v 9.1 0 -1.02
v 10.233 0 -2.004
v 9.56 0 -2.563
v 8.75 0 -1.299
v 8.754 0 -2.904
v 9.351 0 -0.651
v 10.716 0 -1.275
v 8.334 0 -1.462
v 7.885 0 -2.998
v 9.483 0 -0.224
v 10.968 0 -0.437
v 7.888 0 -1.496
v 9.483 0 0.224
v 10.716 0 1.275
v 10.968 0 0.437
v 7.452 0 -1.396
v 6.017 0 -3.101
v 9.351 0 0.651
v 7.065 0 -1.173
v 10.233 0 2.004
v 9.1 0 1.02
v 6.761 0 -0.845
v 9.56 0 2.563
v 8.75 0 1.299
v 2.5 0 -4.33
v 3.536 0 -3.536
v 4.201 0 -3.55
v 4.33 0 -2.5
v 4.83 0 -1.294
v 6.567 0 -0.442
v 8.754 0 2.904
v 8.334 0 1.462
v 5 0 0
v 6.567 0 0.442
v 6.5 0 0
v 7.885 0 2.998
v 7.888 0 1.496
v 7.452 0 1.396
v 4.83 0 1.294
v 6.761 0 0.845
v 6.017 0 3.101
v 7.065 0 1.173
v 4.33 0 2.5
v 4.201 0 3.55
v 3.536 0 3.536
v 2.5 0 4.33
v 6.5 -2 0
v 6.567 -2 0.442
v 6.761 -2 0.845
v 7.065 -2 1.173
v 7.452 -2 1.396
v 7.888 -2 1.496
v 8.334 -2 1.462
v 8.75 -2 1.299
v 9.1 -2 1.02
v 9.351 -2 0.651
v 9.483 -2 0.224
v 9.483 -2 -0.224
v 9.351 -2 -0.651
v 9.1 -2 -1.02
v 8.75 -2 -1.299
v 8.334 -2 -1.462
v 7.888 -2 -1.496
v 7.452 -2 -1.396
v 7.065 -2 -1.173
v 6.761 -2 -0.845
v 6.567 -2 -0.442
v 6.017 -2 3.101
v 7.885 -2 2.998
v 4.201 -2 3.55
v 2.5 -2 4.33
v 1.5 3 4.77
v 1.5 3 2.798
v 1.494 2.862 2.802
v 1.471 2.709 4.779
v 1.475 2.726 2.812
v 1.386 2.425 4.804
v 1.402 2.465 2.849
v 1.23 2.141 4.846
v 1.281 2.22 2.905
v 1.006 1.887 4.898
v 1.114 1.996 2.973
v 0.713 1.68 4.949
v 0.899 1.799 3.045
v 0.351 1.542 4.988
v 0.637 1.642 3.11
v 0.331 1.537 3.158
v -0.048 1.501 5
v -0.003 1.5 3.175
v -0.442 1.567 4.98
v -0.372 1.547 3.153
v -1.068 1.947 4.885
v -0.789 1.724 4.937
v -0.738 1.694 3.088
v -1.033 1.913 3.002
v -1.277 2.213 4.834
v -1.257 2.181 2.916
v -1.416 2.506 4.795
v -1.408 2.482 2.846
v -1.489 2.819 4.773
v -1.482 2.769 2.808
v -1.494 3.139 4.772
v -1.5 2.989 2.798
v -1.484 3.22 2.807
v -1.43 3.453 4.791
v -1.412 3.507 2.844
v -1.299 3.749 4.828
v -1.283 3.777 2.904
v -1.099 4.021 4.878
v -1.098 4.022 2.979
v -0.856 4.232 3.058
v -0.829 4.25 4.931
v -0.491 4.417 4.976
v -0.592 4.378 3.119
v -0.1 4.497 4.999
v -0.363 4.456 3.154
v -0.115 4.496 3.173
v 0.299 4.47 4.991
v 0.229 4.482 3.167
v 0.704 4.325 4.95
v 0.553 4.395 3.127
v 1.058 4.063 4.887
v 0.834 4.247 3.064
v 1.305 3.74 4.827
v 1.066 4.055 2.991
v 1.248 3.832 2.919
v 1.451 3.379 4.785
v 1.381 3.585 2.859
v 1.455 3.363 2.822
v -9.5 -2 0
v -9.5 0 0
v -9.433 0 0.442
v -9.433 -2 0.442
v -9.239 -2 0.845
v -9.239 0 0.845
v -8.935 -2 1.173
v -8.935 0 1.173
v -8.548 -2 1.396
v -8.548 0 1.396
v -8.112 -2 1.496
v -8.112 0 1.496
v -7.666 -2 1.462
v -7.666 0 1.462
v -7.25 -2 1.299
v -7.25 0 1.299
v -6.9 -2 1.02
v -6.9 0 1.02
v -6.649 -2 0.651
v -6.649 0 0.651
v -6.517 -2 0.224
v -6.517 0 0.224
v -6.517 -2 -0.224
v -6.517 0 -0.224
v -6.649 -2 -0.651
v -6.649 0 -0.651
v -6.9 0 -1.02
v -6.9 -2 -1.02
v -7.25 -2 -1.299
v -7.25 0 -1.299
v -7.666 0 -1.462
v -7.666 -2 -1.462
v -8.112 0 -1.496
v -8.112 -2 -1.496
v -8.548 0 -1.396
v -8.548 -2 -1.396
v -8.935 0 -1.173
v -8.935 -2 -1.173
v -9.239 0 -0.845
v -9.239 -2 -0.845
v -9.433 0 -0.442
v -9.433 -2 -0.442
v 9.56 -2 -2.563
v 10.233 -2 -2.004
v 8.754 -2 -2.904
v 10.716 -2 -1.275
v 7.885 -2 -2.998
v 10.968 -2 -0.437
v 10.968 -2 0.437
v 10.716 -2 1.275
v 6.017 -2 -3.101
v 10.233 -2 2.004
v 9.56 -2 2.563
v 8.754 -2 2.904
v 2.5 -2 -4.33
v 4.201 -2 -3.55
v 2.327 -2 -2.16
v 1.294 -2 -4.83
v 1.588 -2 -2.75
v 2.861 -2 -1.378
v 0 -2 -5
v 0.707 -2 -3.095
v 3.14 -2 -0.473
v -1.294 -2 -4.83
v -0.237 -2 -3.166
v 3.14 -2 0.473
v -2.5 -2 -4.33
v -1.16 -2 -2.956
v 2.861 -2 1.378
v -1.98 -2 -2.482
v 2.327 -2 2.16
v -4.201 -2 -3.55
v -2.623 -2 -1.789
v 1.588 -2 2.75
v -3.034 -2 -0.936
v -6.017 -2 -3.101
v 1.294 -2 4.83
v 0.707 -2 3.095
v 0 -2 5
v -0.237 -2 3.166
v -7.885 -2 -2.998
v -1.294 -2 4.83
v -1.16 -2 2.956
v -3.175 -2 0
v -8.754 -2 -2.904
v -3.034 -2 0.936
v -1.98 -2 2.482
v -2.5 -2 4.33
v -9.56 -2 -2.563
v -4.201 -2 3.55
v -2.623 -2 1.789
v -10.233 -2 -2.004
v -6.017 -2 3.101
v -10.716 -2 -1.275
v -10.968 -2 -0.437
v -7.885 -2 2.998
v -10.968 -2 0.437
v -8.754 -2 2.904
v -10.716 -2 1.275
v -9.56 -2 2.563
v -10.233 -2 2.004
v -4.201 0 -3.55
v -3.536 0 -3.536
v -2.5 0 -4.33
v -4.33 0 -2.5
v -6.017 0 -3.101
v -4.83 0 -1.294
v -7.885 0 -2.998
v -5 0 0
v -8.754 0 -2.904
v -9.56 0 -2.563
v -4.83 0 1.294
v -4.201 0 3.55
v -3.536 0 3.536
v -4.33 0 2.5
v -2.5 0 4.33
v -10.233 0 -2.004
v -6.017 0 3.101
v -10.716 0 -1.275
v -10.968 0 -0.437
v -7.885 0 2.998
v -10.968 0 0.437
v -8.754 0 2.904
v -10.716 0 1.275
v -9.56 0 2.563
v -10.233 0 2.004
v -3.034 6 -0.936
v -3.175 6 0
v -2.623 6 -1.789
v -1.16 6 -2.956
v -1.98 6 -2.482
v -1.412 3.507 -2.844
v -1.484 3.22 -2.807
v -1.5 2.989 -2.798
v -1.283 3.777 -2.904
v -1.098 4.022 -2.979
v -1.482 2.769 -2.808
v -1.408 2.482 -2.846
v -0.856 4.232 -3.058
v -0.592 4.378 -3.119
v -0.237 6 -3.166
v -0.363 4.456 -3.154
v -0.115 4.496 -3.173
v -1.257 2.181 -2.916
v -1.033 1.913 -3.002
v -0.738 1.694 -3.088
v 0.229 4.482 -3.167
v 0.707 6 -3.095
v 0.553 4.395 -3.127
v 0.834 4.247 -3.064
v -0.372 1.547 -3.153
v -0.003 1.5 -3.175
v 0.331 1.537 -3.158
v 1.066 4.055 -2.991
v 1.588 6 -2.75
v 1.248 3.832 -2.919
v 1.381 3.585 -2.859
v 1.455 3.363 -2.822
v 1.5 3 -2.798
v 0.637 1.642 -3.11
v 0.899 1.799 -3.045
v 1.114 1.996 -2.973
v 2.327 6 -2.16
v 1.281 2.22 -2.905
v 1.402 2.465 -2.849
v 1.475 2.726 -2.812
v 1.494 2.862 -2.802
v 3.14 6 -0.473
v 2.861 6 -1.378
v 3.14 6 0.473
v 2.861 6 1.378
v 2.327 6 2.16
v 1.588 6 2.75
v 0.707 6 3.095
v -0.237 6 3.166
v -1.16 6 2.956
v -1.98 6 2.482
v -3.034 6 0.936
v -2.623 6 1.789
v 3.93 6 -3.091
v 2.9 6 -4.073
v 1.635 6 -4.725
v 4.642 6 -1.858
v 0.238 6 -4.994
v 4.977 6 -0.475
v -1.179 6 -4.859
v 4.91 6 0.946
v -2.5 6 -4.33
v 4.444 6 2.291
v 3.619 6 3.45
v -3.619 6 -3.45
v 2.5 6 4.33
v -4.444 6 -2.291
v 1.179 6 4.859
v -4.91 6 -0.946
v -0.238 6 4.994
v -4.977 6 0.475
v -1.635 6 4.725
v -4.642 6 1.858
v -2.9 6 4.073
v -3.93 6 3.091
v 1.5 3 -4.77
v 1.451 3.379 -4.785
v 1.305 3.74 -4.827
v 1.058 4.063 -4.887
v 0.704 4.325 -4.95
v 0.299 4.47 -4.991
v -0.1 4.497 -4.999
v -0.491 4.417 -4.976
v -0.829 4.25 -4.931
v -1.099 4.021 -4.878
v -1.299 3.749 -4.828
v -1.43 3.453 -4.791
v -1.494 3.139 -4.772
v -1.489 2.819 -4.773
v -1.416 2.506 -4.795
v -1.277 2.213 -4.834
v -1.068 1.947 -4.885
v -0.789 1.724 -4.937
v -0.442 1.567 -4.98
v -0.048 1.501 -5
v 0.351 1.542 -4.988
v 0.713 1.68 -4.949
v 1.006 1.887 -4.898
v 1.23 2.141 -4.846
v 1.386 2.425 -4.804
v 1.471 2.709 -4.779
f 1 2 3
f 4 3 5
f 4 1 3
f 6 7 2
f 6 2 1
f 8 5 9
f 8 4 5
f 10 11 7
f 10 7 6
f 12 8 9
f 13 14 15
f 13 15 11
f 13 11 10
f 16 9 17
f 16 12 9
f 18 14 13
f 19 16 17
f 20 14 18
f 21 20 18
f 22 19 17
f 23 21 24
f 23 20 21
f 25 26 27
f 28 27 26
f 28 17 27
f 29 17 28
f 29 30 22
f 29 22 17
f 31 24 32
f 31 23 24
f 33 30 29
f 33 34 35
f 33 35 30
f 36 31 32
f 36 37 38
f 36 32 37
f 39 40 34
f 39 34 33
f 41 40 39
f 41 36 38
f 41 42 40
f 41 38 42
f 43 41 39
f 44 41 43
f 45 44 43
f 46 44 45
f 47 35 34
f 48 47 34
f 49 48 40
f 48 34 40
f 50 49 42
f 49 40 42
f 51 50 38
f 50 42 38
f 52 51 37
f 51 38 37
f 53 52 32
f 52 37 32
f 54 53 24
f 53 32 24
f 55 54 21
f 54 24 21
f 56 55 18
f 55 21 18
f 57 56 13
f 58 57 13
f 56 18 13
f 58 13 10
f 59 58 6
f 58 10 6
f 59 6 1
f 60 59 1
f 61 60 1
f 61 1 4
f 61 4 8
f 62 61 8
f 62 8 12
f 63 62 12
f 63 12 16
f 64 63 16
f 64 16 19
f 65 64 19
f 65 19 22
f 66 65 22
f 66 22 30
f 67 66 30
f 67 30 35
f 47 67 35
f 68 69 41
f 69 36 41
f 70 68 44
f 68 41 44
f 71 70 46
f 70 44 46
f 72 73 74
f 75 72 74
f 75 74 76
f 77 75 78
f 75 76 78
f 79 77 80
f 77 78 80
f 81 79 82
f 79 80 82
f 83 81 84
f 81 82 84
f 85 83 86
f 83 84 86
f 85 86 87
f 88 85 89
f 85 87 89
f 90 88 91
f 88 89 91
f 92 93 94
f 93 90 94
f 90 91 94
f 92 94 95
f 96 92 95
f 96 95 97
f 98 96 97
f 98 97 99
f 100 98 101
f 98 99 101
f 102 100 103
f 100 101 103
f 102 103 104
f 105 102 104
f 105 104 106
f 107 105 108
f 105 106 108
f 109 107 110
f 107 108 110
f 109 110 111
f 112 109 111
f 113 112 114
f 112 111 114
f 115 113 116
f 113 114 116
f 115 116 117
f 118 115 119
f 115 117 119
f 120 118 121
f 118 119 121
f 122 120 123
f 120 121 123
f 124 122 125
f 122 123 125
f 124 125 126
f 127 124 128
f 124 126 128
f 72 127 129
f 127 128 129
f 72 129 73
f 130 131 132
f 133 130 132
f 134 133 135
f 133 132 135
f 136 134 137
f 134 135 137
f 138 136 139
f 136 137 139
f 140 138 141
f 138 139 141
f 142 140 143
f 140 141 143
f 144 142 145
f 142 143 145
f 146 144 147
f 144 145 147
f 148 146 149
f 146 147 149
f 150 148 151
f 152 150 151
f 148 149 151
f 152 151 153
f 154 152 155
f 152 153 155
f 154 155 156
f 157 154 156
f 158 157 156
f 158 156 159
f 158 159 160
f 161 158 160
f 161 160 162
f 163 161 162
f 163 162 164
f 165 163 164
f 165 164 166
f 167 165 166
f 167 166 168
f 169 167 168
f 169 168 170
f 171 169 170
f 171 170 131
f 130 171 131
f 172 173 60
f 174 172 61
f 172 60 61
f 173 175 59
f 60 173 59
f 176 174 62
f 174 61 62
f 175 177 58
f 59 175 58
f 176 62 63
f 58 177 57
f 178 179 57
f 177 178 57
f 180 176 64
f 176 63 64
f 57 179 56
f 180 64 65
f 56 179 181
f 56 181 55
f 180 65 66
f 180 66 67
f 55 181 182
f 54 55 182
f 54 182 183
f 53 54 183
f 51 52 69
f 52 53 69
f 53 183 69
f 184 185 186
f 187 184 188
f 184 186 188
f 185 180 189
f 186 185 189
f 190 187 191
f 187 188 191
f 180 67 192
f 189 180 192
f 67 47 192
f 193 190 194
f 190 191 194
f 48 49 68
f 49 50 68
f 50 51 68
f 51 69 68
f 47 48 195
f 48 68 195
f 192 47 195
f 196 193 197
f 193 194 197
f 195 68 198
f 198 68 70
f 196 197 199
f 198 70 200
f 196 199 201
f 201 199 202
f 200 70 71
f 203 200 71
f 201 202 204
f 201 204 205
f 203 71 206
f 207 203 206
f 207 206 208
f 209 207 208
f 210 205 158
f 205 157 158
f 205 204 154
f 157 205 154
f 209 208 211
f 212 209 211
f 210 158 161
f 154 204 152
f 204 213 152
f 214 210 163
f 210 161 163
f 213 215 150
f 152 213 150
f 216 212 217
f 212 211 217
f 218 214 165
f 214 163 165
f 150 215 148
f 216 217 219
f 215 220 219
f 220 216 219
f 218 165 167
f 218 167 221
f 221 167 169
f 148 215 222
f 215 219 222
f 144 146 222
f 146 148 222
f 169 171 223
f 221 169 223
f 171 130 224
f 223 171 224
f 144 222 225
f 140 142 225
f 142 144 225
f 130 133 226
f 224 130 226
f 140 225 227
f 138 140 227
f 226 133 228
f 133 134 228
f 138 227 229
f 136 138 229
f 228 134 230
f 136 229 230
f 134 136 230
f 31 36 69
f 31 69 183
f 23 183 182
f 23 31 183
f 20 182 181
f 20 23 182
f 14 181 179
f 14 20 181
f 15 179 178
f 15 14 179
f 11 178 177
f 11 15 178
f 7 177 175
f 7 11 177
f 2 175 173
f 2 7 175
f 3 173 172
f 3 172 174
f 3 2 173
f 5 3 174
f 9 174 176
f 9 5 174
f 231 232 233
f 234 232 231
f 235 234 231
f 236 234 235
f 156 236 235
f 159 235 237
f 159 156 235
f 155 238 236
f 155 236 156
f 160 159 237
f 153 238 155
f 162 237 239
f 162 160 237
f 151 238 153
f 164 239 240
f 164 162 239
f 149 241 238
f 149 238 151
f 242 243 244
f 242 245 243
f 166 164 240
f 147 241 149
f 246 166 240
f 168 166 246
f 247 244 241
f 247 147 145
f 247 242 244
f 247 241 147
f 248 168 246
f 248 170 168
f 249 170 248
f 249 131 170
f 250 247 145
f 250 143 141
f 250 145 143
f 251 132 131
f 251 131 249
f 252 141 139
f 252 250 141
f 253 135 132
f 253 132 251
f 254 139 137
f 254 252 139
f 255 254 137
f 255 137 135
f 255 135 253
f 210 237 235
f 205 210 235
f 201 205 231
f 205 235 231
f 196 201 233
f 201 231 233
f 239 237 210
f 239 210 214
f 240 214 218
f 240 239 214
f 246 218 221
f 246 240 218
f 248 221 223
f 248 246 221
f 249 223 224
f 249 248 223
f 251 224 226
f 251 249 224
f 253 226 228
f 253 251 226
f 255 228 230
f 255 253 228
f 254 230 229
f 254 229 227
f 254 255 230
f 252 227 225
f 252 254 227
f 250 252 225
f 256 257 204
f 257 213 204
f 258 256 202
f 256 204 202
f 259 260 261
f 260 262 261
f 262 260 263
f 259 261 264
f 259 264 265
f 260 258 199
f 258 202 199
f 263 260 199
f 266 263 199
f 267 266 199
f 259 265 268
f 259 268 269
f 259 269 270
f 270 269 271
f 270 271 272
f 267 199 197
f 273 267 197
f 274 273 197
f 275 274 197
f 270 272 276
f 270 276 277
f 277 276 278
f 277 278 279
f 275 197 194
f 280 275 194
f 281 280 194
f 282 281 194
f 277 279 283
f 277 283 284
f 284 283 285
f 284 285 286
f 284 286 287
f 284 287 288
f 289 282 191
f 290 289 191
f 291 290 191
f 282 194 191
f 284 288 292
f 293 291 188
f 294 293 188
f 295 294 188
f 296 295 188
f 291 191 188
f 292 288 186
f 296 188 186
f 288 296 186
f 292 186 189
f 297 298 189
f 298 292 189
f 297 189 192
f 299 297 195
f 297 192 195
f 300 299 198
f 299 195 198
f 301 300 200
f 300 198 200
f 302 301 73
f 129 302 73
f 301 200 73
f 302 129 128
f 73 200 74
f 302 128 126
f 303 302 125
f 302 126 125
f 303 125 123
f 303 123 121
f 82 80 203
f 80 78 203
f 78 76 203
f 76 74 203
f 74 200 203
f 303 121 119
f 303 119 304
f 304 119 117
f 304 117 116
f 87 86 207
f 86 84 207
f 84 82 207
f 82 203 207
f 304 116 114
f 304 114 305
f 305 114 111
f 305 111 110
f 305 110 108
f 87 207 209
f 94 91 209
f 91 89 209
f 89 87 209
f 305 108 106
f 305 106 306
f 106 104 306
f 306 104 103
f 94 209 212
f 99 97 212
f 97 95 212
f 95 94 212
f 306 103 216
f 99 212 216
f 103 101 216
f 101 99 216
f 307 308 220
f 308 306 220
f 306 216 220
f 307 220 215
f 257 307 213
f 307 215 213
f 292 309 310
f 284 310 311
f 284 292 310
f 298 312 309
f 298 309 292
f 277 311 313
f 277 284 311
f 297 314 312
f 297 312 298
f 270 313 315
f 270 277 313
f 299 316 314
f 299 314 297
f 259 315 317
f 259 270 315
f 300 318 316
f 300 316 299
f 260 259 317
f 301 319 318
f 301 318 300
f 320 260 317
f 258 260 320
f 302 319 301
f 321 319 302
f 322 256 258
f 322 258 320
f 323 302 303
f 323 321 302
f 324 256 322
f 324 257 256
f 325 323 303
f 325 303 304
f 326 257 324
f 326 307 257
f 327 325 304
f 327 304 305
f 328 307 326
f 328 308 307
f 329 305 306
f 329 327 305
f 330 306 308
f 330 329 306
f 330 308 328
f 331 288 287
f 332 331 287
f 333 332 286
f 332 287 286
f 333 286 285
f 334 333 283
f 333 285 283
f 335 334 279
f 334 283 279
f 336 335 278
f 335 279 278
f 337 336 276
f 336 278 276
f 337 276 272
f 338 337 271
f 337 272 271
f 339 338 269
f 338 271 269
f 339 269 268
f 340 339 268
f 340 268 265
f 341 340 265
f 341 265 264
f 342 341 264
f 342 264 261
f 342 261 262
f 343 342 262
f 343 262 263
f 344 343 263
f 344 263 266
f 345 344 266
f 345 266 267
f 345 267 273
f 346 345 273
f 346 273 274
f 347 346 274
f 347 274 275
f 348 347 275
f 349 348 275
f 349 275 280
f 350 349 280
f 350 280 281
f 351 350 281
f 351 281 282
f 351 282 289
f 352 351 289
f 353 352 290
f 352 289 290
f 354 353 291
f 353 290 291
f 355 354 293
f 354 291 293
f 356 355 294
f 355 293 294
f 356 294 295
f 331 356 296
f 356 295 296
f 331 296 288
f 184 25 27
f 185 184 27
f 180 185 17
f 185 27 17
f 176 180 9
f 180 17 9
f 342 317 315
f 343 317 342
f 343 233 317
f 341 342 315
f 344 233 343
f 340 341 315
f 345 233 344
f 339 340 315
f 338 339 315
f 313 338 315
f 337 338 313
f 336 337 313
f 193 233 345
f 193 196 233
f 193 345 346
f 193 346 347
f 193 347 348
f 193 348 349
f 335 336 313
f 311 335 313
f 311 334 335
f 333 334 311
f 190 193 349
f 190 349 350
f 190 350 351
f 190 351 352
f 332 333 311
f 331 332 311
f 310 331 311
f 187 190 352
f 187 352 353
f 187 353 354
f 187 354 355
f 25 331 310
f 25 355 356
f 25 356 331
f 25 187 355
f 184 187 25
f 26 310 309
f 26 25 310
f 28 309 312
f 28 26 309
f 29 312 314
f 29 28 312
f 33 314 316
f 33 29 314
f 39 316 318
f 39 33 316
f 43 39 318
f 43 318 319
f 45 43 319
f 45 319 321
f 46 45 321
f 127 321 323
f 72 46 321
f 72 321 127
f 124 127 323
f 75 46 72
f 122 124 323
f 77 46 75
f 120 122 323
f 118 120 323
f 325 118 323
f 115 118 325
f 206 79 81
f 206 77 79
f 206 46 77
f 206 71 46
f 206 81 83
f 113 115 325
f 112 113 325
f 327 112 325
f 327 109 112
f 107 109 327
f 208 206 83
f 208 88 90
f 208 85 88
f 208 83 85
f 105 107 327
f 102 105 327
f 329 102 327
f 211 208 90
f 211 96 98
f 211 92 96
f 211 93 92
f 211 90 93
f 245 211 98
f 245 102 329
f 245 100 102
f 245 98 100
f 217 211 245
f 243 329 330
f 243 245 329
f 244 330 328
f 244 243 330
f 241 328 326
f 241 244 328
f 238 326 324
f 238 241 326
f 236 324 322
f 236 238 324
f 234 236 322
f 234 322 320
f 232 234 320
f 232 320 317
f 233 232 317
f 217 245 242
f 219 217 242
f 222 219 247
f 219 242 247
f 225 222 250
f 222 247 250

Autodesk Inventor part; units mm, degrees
ref_plane "YZ Plane" through (0, 0, 0) normal (1, 0, 0) x (0, 1, 0)
ref_plane "XZ Plane" through (0, 0, 0) normal (0, 1, 0) x (-1, 0, 0)
sketch "Sketch1" plane through (0, 0, 0) normal (0, 1, 0) x (-1, 0, 0)
  circle A0 centre (0, 0) radius 3.175
  arc A1 (2.5, 4.3301) -> (2.5, -4.3301) centre (0, 0) ccw
  circle A2 centre (8, 0) radius 1.5
  circle A3 centre (-8, 0) radius 1.5
  arc A4 (-7.8846, 2.9978) -> (-7.8846, -2.9978) centre (-8, 0) ccw
  arc A5 (-2.5, -4.3301) -> (-7.8846, -2.9978) centre (-7.5, -12.9904) ccw
  arc A6 (-7.8846, 2.9978) -> (-2.5, 4.3301) centre (-7.5, 12.9904) ccw
  line L0 (0, 0) -> (0, -5) construction
  arc A7 (7.8846, -2.9978) -> (7.8846, 2.9978) centre (8, 0) ccw
  arc A8 (7.8846, -2.9978) -> (2.5, -4.3301) centre (7.5, -12.9904) ccw
  arc A9 (2.5, 4.3301) -> (7.8846, 2.9978) centre (7.5, 12.9904) ccw
  arc A10 (2.5, -4.3301) -> (2.5, 4.3301) centre (0, 0) ccw
  dimension "d0" = 6.35
  dimension "d1" = 10
  dimension "d2" = 3
  dimension "d3" = 3
  dimension "d4" = 8
  dimension "d5" = 8
  dimension "d6" = 3
  dimension "d14" = 10
extrude "Extrusion1" add sketch "Sketch1" against normal blind 2
extrude "Extrusion2" add sketch "Sketch1" along normal blind 6 contours A10 A1
sketch "Sketch2" plane through (0, 0, 0) normal (0, 0, 1) x (1, 0, 0)
  circle A0 centre (0, 3) radius 1.5
  line L0 (5, 6) -> (5, 0) projected
  point P0 (0, 0)
  point P1 (5, 3)
  dimension "d11" = 3
extrude "Extrusion3" cut sketch "Sketch2" along normal through all both and the other way through all
ref_plane "Work Plane1" through (0, 0, 5) normal (0, 0, 1) x (1, 0, 0)
properties part number "EncoderWheelAdapter" material "ABS Plastic"
